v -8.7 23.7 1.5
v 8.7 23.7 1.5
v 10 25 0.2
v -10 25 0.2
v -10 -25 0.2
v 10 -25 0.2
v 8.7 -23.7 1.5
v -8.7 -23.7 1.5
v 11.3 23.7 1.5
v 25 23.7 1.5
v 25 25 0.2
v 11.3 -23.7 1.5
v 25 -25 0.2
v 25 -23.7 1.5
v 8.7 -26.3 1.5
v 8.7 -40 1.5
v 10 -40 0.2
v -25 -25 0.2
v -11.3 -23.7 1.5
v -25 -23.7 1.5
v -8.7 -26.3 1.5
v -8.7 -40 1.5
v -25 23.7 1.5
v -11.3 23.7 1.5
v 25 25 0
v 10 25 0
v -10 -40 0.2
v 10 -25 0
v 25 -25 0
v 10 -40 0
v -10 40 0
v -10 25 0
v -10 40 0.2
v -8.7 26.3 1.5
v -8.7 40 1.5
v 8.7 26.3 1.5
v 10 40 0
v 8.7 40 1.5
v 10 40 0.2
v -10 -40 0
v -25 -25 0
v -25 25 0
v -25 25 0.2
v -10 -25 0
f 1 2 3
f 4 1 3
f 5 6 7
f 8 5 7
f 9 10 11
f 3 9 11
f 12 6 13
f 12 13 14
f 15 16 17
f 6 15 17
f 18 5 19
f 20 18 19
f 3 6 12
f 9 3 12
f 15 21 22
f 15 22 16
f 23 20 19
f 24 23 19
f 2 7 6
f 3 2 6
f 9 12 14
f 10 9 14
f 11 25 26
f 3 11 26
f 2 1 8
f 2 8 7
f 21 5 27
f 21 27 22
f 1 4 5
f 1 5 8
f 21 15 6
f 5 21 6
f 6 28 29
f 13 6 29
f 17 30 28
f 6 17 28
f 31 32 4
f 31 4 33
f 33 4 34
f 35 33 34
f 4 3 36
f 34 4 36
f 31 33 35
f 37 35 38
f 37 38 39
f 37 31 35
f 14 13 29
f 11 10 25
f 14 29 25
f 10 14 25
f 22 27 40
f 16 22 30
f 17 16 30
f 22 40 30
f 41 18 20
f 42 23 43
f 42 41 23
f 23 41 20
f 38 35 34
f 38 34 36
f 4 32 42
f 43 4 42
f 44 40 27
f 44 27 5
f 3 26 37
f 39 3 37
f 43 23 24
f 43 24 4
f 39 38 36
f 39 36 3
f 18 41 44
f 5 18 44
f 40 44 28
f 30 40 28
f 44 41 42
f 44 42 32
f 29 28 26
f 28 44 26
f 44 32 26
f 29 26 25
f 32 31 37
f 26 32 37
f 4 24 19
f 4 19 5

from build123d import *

# Parameters (mm, degrees)
SKETCH_W        = 20
SKETCH_H        = 50
SKETCH_W_2      = 15
SKETCH_H_2      = 15
PAD_DEPTH       = 1.5
POCKET_DEPTH    = 80.001
POCKET001_DEPTH = 50.001


with BuildPart() as part:
    # Sketch → Pad (new body)
    with BuildSketch(Plane.XY):
        Rectangle(SKETCH_W, SKETCH_H)
        with Locations((17.5, 0)):
            Rectangle(SKETCH_W_2, SKETCH_H)
        with Locations((-17.5, 0)):
            Rectangle(SKETCH_W_2, SKETCH_H)
        with Locations((0, 32.5)):
            Rectangle(SKETCH_W, SKETCH_H_2)
        with Locations((0, -32.5)):
            Rectangle(SKETCH_W, SKETCH_H_2)
    extrude(amount=PAD_DEPTH)

    # Sketch001 (on Face6 of Pad) → Pocket (cut, through all)
    with BuildSketch(Plane.XZ.offset(40)):
        Polygon((10, 0.2), (11.3, 1.5), (8.7, 1.5), align=None)
        Polygon((-11.3, 1.5), (-10, 0.2), (-8.7, 1.5), align=None)
    extrude(amount=-POCKET_DEPTH, mode=Mode.SUBTRACT)

    # Sketch002 (on Face10 of Pocket) → Pocket001 (cut, through all)
    with BuildSketch(Plane.YZ.offset(25)):
        Polygon((-25, 0.2), (-23.7, 1.5), (-26.3, 1.5), align=None)
        Polygon((25, 0.2), (26.3, 1.5), (23.7, 1.5), align=None)
    extrude(amount=-POCKET001_DEPTH, mode=Mode.SUBTRACT)


solid = part.part
